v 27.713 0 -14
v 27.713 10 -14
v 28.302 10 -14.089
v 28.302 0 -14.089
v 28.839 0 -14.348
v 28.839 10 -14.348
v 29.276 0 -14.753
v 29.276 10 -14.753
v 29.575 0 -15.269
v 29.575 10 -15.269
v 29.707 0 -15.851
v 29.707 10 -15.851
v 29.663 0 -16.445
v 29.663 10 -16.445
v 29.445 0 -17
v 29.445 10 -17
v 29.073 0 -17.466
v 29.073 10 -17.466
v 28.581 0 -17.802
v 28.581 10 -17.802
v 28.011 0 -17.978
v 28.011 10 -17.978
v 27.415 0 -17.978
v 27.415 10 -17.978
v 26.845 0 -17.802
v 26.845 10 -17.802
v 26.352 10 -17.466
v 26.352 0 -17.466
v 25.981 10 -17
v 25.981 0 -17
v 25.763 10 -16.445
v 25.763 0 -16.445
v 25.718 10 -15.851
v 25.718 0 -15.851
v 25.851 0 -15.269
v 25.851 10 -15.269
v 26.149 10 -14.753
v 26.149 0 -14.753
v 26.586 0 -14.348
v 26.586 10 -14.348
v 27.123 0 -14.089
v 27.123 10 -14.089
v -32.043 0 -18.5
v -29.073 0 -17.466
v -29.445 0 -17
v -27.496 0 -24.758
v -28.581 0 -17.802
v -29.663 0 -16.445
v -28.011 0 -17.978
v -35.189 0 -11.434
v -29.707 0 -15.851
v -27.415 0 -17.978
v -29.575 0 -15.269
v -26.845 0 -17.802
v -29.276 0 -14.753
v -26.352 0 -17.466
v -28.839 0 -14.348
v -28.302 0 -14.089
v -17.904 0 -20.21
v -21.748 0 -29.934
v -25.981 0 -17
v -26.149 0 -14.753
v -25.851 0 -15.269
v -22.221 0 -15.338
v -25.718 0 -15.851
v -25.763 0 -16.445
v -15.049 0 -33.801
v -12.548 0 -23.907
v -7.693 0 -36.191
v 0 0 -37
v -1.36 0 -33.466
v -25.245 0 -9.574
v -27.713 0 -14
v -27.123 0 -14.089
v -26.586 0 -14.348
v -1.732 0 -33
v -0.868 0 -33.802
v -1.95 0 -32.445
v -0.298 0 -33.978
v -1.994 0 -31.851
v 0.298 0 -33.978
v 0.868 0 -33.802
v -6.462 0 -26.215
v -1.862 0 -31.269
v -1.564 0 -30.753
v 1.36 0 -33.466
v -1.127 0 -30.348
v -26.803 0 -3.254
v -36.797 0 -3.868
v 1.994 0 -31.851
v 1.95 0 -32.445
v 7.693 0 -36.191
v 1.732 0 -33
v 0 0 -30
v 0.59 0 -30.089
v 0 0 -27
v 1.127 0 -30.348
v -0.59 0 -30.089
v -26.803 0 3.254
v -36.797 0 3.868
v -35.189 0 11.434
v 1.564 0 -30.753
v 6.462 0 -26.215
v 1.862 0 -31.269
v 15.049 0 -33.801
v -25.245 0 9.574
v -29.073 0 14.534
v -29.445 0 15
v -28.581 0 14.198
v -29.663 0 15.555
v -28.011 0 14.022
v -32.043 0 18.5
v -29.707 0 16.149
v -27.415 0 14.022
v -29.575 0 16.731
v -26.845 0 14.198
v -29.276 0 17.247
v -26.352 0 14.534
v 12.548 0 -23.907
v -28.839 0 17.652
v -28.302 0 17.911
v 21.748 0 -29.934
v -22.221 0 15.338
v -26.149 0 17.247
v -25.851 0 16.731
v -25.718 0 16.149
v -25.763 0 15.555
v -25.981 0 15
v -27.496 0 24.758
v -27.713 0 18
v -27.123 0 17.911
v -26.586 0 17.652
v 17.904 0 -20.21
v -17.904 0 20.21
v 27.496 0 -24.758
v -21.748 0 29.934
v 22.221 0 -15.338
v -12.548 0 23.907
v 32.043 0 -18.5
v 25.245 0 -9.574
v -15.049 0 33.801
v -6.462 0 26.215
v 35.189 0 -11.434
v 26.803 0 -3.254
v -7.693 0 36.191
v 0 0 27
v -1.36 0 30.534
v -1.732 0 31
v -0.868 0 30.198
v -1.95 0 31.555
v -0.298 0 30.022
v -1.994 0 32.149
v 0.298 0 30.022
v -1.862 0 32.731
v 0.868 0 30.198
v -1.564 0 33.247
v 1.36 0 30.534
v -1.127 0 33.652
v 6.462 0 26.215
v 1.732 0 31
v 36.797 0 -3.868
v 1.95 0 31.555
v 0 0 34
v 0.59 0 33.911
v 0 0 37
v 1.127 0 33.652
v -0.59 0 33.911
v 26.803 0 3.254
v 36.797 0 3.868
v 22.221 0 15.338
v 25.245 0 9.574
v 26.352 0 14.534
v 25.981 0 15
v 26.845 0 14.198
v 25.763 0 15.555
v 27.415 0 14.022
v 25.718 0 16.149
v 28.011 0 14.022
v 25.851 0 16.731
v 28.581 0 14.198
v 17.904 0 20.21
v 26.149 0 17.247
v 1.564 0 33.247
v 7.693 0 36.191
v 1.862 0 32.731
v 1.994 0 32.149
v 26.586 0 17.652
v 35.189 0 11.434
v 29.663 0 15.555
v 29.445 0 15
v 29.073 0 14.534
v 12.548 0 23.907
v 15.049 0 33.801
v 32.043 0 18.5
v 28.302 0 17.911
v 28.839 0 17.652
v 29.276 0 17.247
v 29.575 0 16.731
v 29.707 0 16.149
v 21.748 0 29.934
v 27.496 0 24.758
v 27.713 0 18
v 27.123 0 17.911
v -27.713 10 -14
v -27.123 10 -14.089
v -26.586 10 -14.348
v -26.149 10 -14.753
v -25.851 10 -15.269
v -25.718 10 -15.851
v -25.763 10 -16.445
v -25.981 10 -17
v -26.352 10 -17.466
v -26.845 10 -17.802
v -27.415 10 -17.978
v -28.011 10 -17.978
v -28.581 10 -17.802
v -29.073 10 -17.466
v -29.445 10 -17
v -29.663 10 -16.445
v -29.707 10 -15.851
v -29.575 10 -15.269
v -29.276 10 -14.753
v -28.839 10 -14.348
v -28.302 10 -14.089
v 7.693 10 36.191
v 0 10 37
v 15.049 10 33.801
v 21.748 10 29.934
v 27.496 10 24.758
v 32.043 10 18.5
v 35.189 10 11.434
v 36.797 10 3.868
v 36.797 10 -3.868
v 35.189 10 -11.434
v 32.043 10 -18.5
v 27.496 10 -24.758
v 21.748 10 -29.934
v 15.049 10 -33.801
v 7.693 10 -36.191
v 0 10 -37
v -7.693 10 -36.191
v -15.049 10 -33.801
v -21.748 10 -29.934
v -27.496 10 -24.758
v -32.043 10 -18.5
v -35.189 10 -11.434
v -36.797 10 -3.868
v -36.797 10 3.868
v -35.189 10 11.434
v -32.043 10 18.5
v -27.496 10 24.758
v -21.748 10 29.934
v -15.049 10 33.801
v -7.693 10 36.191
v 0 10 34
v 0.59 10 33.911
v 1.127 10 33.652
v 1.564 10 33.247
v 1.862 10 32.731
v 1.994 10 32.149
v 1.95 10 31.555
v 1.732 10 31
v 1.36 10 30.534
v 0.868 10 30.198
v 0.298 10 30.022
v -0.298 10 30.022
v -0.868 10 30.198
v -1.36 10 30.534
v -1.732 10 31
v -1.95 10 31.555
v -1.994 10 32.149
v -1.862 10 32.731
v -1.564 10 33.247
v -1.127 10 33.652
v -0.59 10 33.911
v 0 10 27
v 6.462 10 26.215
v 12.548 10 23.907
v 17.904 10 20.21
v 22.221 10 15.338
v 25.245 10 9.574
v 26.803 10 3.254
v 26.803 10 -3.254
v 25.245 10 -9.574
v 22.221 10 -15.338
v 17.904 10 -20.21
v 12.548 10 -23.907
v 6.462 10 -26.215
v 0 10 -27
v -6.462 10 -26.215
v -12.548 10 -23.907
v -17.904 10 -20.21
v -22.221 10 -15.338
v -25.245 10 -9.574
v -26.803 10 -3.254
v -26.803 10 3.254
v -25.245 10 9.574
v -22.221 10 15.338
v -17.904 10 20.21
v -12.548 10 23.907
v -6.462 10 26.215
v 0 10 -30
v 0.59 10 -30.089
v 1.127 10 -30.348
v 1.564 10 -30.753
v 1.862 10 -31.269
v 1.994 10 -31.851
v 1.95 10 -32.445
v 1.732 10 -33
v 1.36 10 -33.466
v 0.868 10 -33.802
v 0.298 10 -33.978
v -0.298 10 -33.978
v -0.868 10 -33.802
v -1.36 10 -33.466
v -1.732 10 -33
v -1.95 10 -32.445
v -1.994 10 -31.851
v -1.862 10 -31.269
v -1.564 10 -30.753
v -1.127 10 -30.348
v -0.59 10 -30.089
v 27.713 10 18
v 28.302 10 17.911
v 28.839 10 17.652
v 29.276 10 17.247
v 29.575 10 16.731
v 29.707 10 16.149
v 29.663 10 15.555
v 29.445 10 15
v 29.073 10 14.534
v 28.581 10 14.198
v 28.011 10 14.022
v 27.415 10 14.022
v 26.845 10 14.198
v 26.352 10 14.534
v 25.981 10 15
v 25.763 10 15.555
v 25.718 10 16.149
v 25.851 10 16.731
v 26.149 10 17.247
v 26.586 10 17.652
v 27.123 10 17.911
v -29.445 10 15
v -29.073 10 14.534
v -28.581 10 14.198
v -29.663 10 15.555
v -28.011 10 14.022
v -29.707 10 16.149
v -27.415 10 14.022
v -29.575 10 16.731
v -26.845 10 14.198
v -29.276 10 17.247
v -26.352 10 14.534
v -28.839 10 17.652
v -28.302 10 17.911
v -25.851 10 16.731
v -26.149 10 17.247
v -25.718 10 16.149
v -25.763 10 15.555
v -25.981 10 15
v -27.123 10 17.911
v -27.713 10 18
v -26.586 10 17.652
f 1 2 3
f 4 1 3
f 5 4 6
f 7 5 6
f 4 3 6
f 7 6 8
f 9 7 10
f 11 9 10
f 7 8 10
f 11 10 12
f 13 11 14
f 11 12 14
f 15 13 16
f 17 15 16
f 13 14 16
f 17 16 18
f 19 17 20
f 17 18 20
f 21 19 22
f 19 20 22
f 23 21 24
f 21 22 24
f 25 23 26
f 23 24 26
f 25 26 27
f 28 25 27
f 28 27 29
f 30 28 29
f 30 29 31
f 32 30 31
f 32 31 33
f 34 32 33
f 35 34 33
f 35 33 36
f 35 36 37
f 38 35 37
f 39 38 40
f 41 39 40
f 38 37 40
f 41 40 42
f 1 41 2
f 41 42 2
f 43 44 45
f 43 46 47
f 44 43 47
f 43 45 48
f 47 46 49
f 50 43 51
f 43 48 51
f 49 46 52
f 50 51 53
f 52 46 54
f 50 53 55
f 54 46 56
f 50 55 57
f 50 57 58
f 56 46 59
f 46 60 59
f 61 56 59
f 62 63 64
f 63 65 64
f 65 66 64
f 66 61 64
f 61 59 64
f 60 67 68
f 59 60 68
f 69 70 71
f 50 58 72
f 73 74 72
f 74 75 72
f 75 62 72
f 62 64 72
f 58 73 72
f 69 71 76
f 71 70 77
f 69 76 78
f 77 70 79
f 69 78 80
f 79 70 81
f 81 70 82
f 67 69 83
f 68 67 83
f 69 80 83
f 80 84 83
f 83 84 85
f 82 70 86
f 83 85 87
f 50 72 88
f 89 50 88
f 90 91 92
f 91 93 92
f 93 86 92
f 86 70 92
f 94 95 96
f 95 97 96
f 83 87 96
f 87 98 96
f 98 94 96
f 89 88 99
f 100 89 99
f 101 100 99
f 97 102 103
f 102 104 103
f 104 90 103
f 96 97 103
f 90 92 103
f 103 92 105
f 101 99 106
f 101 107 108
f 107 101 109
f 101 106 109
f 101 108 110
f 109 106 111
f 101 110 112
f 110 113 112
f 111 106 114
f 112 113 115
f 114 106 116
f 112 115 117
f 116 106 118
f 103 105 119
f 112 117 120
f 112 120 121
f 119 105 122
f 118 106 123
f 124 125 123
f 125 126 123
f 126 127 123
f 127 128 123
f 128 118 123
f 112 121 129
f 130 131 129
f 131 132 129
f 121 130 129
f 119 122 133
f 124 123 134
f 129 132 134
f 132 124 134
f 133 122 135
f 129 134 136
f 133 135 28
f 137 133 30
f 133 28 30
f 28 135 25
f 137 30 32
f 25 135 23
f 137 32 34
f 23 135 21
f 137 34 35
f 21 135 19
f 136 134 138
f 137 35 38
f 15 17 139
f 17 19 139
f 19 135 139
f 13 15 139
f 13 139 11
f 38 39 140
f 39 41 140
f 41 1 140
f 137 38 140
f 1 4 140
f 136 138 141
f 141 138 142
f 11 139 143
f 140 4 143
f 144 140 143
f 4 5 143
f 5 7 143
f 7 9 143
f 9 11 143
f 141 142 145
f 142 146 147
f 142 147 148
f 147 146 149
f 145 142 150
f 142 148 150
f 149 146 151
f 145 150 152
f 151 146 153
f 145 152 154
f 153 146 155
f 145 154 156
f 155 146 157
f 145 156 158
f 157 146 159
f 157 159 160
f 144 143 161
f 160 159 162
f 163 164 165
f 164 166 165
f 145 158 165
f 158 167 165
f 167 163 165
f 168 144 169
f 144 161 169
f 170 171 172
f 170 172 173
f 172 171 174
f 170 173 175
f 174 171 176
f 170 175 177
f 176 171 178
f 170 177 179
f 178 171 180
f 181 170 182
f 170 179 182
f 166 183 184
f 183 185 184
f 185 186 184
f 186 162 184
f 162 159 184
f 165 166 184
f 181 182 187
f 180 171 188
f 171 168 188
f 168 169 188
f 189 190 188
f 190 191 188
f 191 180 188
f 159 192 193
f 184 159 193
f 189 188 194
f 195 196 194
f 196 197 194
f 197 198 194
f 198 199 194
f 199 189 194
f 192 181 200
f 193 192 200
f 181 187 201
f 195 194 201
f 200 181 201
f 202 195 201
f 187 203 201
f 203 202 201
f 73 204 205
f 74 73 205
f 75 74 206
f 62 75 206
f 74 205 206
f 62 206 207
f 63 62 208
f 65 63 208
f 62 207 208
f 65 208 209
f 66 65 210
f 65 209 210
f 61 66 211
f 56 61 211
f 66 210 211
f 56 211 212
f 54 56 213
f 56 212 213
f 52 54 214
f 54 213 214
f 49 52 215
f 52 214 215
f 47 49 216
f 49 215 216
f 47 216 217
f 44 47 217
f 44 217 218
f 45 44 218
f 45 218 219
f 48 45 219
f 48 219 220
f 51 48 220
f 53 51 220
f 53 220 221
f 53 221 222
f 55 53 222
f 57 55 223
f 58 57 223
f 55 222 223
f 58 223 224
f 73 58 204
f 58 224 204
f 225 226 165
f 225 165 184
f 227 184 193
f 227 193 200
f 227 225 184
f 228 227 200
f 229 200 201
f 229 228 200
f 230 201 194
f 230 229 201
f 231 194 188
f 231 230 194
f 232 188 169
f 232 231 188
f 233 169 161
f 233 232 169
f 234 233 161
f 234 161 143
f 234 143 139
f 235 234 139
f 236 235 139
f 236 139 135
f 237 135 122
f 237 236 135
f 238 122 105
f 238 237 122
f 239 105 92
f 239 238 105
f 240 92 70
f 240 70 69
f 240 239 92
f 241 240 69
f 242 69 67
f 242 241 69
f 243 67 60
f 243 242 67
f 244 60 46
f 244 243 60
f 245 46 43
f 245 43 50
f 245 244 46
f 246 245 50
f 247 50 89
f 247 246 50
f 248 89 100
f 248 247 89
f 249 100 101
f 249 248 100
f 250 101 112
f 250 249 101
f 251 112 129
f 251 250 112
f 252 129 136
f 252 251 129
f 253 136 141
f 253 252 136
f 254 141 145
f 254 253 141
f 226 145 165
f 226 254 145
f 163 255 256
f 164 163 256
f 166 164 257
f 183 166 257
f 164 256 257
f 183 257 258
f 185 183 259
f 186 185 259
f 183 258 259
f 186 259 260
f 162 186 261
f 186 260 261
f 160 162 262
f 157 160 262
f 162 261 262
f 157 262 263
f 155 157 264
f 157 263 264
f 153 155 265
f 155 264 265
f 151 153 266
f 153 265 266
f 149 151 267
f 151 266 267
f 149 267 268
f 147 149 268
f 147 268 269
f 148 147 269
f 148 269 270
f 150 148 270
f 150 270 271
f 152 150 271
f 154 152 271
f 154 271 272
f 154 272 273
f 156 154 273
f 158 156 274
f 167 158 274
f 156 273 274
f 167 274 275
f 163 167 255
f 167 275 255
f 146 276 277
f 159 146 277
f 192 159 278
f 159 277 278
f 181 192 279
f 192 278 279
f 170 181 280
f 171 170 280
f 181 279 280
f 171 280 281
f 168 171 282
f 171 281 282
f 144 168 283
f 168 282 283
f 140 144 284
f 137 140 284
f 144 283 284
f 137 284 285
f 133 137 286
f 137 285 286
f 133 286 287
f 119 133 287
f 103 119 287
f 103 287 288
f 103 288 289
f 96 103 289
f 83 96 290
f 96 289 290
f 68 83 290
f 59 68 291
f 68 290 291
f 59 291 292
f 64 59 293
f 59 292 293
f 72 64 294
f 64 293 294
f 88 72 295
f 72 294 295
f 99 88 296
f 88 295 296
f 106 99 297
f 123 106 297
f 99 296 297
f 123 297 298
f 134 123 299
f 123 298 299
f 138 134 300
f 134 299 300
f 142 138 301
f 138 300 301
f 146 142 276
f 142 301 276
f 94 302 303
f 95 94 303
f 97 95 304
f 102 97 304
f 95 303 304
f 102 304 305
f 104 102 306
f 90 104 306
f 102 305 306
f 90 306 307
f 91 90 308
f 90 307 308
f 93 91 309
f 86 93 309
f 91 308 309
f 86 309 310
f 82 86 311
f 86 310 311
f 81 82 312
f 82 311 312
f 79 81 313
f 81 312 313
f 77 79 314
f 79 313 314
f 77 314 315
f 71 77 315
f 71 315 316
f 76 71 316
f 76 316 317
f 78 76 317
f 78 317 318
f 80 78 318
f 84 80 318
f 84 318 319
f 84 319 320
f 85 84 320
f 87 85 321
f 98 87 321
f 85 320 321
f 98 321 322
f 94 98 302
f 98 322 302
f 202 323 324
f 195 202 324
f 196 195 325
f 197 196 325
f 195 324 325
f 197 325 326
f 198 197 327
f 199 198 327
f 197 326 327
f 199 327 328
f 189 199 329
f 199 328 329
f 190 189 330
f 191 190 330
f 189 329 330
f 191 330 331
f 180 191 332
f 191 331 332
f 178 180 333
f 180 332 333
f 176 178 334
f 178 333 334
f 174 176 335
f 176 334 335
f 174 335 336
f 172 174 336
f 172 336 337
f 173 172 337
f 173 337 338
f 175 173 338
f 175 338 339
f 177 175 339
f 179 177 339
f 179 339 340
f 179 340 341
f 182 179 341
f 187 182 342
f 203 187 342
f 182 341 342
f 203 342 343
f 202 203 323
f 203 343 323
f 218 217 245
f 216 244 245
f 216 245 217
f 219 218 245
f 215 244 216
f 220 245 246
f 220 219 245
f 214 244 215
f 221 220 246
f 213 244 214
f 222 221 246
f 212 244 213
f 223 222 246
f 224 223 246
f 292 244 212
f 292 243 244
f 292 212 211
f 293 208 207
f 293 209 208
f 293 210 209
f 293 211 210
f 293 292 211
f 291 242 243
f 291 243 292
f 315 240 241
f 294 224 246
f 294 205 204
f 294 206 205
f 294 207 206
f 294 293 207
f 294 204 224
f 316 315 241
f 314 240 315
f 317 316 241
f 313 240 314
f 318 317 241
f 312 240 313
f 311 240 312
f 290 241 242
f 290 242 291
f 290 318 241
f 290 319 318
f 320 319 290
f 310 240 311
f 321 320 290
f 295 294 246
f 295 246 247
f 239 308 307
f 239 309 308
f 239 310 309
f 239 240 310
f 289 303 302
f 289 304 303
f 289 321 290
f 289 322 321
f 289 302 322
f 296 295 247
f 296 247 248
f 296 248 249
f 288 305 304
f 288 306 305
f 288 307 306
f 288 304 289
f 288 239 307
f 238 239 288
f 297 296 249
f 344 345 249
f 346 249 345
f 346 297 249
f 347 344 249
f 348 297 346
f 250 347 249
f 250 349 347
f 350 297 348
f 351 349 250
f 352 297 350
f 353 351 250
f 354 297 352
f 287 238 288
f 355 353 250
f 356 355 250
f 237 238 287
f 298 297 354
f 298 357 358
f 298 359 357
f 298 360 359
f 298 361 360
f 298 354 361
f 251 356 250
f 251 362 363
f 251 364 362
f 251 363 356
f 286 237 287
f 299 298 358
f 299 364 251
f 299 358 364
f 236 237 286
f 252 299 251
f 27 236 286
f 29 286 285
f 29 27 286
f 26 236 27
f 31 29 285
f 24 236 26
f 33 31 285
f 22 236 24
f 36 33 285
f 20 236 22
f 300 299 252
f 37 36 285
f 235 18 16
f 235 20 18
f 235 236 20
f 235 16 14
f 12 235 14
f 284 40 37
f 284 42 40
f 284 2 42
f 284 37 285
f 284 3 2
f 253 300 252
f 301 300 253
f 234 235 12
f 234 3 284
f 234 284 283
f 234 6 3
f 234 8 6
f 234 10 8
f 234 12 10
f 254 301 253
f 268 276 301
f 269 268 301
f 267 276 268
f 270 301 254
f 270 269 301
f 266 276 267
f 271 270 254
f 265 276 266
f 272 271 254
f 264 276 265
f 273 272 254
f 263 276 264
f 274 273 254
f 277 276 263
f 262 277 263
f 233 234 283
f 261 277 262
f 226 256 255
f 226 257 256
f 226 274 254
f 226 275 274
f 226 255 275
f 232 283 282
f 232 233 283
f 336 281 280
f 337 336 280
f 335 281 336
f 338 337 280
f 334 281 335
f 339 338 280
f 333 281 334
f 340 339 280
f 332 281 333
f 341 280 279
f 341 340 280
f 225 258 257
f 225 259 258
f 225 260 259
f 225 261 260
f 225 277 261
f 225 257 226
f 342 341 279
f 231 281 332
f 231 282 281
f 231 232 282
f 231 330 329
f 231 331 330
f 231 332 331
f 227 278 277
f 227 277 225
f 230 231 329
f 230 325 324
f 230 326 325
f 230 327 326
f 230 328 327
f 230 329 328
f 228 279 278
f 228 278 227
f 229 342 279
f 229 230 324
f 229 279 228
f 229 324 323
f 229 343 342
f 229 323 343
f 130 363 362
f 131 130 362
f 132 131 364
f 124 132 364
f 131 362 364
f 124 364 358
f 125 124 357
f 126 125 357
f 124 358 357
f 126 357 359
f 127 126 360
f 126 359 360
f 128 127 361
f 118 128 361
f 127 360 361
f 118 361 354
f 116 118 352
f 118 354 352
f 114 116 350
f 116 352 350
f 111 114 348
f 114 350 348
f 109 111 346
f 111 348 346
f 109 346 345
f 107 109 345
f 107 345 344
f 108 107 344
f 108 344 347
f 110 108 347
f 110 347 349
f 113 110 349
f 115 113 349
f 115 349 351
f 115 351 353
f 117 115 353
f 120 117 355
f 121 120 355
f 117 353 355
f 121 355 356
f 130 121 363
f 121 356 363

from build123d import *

# Parameters (mm, degrees)
SKETCH1_R           = 45
BOSS_EXTRUDE1_DEPTH = 10
SKETCH2_R           = 45
SKETCH2_R_2         = 37
SKETCH2_R_3         = 27
CUT_EXTRUDE1_DEPTH  = 10
SKETCH3_R           = 2
CUT_EXTRUDE2_DEPTH  = 10


with BuildPart() as part:
    # Sketch1 → Boss-Extrude1 (new body)
    with BuildSketch(Plane(origin=(0, 0, 0), x_dir=(1, 0, 0), z_dir=(0, 1, 0))):
        with Locations(Location((0, 0, 0), (0, 0, 270))):
            Circle(SKETCH1_R)
    extrude(amount=BOSS_EXTRUDE1_DEPTH)

    # Sketch2 → Cut-Extrude1 (cut)
    with BuildSketch(Plane(origin=(0, 10, 0), x_dir=(1, 0, 0), z_dir=(0, 1, 0))):
        Circle(SKETCH2_R)
        with Locations(Location((0, 0, 0), (0, 0, 270))):
            Circle(SKETCH2_R_2, mode=Mode.SUBTRACT)
        with Locations(Location((0, 0, 0), (0, 0, 270))):
            Circle(SKETCH2_R_3)
    extrude(amount=-CUT_EXTRUDE1_DEPTH, mode=Mode.SUBTRACT)

    # Sketch3 → Cut-Extrude2 (cut)
    with BuildSketch(Plane(origin=(0, 10, 0), x_dir=(1, 0, 0), z_dir=(0, 1, 0))):
        with Locations(Location((0, 32, 0), (0, 0, 270))):
            Circle(SKETCH3_R)
        with Locations(Location((27.712812921, 16, 0), (0, 0, 270))):
            Circle(SKETCH3_R)
        with Locations(Location((27.712812921, -16, 0), (0, 0, 270))):
            Circle(SKETCH3_R)
        with Locations(Location((0, -32, 0), (0, 0, 270))):
            Circle(SKETCH3_R)
        with Locations(Location((-27.712812921, -16, 0), (0, 0, 270))):
            Circle(SKETCH3_R)
        with Locations(Location((-27.712812921, 16, 0), (0, 0, 270))):
            Circle(SKETCH3_R)
    extrude(amount=-CUT_EXTRUDE2_DEPTH, mode=Mode.SUBTRACT)


solid = part.part
